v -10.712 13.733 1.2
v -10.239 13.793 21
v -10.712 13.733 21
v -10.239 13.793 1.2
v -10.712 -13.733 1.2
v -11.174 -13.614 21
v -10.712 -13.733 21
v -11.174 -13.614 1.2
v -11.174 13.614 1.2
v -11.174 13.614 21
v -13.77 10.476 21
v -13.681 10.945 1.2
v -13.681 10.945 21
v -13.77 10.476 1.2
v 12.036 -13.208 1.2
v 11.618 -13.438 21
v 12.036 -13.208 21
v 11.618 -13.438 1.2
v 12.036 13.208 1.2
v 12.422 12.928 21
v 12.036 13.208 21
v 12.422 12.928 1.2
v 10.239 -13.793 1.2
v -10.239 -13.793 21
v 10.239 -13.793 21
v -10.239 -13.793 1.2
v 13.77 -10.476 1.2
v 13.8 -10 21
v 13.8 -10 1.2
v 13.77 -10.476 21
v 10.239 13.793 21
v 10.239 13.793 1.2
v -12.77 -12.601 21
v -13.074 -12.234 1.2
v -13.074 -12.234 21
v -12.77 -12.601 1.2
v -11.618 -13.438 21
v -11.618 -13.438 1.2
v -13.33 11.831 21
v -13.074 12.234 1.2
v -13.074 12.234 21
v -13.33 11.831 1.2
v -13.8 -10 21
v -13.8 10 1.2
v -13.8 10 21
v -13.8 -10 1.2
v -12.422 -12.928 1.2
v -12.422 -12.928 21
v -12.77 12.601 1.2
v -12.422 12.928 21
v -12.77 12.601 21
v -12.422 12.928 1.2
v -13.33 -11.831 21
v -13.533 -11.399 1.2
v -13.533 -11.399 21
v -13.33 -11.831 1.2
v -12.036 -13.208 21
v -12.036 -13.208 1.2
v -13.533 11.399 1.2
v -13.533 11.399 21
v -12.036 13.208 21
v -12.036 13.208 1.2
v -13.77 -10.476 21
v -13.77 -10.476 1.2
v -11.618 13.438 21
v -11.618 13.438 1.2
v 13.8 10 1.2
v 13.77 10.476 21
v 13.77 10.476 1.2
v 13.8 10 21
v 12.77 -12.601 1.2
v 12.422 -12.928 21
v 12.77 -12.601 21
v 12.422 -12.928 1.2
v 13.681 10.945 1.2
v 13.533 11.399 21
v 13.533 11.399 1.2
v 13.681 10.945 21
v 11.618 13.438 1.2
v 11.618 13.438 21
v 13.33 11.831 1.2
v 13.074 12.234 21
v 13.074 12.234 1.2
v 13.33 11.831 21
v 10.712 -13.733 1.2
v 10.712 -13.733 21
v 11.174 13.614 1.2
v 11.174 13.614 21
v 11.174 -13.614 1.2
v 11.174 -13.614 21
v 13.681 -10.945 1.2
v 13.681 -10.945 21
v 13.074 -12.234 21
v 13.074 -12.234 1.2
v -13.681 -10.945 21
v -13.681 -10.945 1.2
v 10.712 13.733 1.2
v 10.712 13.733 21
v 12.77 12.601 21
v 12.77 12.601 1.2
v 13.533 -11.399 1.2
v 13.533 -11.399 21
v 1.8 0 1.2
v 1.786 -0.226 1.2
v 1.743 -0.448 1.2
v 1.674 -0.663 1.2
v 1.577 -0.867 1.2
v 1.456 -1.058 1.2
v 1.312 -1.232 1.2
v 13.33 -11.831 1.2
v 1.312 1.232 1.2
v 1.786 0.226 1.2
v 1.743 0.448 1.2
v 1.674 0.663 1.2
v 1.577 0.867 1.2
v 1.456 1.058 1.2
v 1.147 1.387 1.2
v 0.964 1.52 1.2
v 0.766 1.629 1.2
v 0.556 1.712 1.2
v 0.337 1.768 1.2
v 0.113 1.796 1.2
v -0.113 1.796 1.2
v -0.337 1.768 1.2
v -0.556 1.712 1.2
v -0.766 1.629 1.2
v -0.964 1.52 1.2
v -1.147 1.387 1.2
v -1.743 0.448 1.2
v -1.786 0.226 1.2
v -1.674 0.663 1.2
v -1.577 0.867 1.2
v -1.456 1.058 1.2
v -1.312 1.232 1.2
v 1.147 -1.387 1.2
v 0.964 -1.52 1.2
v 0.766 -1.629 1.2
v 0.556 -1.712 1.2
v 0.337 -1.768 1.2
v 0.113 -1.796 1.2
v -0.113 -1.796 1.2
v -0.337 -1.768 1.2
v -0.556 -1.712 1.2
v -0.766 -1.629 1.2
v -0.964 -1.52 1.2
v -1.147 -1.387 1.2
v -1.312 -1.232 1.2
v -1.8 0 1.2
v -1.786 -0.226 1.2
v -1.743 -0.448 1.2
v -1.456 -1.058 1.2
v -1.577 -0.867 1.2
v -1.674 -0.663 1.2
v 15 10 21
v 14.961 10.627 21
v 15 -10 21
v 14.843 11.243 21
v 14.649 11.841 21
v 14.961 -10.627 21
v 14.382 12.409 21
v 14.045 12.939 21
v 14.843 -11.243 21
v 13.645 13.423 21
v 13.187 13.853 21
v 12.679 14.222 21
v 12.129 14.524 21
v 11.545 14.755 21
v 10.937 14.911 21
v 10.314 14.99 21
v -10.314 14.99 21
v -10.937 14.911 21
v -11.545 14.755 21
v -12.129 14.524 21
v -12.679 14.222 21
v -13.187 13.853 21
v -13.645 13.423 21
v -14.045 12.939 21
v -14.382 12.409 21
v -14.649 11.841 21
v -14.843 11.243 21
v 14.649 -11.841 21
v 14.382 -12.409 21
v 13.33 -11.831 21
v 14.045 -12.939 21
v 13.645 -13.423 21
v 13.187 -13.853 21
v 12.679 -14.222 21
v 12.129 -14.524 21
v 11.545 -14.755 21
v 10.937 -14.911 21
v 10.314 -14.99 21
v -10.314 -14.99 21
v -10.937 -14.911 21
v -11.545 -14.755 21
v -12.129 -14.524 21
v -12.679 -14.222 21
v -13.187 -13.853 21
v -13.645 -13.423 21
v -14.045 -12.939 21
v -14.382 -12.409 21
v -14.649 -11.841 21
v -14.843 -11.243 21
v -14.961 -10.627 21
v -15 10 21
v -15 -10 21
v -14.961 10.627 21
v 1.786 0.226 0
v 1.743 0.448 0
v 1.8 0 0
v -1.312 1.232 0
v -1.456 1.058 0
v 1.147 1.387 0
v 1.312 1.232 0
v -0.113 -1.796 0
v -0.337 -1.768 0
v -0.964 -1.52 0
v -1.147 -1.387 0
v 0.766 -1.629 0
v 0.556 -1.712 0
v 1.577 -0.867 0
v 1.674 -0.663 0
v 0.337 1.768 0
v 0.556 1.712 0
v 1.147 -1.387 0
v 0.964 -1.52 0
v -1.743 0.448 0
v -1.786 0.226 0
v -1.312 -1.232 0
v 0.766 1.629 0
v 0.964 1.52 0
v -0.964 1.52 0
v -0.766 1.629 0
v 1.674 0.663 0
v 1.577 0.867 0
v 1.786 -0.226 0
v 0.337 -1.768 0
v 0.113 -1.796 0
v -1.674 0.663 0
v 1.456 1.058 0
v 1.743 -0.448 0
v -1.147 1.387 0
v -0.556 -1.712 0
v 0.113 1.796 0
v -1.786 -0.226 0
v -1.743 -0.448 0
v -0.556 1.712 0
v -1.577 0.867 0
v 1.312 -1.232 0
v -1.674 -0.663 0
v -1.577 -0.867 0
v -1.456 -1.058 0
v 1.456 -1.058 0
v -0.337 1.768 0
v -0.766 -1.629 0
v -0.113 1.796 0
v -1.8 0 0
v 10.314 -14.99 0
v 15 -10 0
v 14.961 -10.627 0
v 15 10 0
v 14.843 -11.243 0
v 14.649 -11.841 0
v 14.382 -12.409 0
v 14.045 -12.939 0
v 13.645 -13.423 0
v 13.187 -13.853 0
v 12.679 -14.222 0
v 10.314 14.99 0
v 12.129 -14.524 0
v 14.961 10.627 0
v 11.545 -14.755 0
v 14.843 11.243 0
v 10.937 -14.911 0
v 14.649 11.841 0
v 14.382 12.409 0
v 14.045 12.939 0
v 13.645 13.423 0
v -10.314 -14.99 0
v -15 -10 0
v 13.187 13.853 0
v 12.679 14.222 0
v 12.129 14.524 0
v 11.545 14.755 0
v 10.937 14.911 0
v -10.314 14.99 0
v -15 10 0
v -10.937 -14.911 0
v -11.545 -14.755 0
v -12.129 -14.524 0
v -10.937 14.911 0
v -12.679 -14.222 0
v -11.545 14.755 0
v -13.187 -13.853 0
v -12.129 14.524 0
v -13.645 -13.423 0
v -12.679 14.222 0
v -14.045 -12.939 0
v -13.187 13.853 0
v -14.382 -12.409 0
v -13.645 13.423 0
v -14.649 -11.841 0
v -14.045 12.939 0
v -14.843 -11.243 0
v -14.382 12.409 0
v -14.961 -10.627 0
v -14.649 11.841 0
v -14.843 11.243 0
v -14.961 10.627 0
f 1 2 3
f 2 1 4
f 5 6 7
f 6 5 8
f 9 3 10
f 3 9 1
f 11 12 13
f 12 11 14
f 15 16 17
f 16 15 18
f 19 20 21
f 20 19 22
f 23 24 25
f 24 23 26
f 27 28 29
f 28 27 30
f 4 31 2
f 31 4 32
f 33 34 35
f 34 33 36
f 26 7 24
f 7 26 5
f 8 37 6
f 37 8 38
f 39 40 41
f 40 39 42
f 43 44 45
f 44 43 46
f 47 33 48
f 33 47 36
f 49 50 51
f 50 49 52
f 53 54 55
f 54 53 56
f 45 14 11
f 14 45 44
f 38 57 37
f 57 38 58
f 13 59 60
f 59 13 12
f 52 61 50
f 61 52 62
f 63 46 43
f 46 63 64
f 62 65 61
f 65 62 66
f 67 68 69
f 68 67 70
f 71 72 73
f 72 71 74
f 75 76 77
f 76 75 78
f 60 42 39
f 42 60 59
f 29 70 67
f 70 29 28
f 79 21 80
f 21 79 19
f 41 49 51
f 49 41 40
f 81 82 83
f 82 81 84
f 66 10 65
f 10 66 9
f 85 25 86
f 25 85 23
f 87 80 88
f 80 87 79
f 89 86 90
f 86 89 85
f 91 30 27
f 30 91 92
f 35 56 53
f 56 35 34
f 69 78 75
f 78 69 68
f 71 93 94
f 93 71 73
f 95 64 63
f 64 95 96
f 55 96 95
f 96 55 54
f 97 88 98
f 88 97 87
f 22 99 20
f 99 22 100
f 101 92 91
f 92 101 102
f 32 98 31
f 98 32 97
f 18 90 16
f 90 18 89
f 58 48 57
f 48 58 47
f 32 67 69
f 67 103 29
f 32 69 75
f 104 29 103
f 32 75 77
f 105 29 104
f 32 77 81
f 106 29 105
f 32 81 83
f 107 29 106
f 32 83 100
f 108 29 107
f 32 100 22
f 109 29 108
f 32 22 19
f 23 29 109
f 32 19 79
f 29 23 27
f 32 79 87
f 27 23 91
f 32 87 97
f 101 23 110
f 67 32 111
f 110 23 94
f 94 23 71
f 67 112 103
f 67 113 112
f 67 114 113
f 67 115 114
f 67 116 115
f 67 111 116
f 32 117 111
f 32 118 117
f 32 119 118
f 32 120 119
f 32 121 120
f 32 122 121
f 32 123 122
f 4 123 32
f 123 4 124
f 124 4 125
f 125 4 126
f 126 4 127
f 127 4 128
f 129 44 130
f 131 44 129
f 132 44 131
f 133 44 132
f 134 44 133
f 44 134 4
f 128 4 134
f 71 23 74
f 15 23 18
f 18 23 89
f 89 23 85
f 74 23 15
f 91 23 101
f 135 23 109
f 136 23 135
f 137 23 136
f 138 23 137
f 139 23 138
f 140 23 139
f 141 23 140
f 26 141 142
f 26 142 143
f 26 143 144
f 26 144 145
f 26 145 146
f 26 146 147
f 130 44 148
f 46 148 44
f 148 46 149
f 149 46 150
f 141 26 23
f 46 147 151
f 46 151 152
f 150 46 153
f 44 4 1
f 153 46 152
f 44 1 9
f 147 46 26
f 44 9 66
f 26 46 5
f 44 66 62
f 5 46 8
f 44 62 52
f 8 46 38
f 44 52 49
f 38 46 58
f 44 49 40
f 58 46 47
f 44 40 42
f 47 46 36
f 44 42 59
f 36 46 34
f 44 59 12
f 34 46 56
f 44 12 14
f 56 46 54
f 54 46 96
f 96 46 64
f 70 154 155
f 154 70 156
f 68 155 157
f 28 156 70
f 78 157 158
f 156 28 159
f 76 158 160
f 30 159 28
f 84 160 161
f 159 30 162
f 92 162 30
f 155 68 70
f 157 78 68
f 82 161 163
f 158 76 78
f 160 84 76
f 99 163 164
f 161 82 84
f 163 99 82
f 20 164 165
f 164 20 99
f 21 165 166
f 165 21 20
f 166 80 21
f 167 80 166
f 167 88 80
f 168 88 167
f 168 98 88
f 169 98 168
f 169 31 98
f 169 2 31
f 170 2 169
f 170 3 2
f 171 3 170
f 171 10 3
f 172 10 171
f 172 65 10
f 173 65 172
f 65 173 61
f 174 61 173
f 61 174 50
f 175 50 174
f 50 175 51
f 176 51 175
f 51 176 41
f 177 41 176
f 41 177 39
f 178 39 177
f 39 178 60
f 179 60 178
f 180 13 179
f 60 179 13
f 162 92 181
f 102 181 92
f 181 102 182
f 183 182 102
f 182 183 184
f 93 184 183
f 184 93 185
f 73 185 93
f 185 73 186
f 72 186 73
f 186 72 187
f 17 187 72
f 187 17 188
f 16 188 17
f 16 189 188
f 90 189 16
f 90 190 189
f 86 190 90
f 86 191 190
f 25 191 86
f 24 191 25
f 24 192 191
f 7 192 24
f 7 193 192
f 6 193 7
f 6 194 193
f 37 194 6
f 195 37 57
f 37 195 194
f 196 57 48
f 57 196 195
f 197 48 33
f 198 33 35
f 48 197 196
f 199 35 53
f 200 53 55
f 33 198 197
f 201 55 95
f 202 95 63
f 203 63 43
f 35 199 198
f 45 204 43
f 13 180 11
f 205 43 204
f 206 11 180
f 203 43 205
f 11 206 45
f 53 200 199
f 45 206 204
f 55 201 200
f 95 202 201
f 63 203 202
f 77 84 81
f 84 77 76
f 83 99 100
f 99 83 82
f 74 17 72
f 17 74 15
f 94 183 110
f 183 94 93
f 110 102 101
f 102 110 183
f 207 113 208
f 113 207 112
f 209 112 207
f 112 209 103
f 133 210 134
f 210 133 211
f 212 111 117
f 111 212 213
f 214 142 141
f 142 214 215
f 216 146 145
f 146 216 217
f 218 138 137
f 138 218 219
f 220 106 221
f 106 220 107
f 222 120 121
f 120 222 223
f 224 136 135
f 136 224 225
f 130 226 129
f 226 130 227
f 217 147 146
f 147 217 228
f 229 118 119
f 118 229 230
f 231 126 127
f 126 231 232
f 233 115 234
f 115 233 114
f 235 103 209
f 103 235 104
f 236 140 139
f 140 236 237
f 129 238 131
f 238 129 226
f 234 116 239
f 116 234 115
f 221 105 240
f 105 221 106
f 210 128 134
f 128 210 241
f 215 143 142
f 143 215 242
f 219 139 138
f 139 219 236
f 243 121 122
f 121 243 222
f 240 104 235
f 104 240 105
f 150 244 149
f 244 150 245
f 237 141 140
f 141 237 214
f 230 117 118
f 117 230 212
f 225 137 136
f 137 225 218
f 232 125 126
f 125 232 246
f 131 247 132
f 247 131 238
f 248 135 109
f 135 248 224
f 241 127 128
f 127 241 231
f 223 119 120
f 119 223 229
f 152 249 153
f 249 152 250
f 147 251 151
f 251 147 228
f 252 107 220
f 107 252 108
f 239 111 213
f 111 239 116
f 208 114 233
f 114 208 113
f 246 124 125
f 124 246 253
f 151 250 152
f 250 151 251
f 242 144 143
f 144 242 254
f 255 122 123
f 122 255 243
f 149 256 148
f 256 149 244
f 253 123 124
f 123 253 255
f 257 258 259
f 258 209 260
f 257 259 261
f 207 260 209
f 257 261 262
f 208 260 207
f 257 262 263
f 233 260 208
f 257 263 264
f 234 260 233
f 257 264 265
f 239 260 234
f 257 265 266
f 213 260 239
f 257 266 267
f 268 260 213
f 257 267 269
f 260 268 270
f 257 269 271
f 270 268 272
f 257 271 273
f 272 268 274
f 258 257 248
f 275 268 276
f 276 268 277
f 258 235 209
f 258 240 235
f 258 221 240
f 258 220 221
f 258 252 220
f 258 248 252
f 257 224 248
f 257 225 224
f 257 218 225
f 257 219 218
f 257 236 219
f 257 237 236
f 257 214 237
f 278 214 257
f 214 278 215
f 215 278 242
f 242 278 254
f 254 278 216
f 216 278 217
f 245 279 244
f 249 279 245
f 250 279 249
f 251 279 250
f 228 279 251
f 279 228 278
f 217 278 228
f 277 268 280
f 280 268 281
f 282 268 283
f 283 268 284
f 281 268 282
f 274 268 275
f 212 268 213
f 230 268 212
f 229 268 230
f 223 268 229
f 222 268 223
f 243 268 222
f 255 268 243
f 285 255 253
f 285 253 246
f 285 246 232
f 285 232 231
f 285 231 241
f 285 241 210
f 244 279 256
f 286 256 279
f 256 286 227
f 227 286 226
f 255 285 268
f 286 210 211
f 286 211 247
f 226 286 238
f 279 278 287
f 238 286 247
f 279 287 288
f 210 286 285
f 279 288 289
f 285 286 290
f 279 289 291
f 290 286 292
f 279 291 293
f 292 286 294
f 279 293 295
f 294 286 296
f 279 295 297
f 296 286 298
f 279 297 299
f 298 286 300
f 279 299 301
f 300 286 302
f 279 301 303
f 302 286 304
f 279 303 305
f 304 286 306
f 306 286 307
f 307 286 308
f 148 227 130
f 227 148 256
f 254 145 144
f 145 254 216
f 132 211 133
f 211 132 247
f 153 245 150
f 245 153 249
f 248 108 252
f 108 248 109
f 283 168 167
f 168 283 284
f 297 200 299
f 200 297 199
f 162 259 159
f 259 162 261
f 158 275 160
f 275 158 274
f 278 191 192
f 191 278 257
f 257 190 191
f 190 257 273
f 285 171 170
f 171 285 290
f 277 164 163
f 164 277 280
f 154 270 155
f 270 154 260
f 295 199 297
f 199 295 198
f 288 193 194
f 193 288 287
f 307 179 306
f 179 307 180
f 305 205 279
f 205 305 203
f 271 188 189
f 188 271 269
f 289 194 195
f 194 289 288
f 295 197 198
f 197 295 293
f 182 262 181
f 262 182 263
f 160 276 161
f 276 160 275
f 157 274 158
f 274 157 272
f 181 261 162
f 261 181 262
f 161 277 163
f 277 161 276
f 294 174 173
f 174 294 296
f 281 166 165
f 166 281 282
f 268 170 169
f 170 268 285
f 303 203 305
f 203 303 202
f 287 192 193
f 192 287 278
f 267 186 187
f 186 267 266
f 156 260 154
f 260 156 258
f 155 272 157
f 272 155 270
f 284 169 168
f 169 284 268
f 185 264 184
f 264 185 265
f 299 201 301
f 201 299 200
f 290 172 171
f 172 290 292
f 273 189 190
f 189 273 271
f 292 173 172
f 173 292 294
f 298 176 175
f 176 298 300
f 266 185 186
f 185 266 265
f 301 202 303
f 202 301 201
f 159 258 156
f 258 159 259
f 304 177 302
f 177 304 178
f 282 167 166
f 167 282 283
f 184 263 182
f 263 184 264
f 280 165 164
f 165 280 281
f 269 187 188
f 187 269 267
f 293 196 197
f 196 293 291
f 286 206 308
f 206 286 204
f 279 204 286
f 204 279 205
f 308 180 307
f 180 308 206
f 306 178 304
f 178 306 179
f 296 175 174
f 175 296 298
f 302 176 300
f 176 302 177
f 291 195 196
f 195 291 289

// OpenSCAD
$fn = 50;


difference() {
	union() {
		hull() {
			translate(v = [-10.0000000000, 10.0000000000, 0]) {
				cylinder(h = 21, r = 5);
			}
			translate(v = [10.0000000000, 10.0000000000, 0]) {
				cylinder(h = 21, r = 5);
			}
			translate(v = [-10.0000000000, -10.0000000000, 0]) {
				cylinder(h = 21, r = 5);
			}
			translate(v = [10.0000000000, -10.0000000000, 0]) {
				cylinder(h = 21, r = 5);
			}
		}
	}
	union() {
		translate(v = [0, 0, 1.2000000000]) {
			hull() {
				translate(v = [-10.0000000000, 10.0000000000, 0]) {
					cylinder(h = 19.8000000000, r = 3.8000000000);
				}
				translate(v = [10.0000000000, 10.0000000000, 0]) {
					cylinder(h = 19.8000000000, r = 3.8000000000);
				}
				translate(v = [-10.0000000000, -10.0000000000, 0]) {
					cylinder(h = 19.8000000000, r = 3.8000000000);
				}
				translate(v = [10.0000000000, -10.0000000000, 0]) {
					cylinder(h = 19.8000000000, r = 3.8000000000);
				}
			}
		}
		#cylinder(h = 1.2000000000, r = 1.8000000000);
	}
}
